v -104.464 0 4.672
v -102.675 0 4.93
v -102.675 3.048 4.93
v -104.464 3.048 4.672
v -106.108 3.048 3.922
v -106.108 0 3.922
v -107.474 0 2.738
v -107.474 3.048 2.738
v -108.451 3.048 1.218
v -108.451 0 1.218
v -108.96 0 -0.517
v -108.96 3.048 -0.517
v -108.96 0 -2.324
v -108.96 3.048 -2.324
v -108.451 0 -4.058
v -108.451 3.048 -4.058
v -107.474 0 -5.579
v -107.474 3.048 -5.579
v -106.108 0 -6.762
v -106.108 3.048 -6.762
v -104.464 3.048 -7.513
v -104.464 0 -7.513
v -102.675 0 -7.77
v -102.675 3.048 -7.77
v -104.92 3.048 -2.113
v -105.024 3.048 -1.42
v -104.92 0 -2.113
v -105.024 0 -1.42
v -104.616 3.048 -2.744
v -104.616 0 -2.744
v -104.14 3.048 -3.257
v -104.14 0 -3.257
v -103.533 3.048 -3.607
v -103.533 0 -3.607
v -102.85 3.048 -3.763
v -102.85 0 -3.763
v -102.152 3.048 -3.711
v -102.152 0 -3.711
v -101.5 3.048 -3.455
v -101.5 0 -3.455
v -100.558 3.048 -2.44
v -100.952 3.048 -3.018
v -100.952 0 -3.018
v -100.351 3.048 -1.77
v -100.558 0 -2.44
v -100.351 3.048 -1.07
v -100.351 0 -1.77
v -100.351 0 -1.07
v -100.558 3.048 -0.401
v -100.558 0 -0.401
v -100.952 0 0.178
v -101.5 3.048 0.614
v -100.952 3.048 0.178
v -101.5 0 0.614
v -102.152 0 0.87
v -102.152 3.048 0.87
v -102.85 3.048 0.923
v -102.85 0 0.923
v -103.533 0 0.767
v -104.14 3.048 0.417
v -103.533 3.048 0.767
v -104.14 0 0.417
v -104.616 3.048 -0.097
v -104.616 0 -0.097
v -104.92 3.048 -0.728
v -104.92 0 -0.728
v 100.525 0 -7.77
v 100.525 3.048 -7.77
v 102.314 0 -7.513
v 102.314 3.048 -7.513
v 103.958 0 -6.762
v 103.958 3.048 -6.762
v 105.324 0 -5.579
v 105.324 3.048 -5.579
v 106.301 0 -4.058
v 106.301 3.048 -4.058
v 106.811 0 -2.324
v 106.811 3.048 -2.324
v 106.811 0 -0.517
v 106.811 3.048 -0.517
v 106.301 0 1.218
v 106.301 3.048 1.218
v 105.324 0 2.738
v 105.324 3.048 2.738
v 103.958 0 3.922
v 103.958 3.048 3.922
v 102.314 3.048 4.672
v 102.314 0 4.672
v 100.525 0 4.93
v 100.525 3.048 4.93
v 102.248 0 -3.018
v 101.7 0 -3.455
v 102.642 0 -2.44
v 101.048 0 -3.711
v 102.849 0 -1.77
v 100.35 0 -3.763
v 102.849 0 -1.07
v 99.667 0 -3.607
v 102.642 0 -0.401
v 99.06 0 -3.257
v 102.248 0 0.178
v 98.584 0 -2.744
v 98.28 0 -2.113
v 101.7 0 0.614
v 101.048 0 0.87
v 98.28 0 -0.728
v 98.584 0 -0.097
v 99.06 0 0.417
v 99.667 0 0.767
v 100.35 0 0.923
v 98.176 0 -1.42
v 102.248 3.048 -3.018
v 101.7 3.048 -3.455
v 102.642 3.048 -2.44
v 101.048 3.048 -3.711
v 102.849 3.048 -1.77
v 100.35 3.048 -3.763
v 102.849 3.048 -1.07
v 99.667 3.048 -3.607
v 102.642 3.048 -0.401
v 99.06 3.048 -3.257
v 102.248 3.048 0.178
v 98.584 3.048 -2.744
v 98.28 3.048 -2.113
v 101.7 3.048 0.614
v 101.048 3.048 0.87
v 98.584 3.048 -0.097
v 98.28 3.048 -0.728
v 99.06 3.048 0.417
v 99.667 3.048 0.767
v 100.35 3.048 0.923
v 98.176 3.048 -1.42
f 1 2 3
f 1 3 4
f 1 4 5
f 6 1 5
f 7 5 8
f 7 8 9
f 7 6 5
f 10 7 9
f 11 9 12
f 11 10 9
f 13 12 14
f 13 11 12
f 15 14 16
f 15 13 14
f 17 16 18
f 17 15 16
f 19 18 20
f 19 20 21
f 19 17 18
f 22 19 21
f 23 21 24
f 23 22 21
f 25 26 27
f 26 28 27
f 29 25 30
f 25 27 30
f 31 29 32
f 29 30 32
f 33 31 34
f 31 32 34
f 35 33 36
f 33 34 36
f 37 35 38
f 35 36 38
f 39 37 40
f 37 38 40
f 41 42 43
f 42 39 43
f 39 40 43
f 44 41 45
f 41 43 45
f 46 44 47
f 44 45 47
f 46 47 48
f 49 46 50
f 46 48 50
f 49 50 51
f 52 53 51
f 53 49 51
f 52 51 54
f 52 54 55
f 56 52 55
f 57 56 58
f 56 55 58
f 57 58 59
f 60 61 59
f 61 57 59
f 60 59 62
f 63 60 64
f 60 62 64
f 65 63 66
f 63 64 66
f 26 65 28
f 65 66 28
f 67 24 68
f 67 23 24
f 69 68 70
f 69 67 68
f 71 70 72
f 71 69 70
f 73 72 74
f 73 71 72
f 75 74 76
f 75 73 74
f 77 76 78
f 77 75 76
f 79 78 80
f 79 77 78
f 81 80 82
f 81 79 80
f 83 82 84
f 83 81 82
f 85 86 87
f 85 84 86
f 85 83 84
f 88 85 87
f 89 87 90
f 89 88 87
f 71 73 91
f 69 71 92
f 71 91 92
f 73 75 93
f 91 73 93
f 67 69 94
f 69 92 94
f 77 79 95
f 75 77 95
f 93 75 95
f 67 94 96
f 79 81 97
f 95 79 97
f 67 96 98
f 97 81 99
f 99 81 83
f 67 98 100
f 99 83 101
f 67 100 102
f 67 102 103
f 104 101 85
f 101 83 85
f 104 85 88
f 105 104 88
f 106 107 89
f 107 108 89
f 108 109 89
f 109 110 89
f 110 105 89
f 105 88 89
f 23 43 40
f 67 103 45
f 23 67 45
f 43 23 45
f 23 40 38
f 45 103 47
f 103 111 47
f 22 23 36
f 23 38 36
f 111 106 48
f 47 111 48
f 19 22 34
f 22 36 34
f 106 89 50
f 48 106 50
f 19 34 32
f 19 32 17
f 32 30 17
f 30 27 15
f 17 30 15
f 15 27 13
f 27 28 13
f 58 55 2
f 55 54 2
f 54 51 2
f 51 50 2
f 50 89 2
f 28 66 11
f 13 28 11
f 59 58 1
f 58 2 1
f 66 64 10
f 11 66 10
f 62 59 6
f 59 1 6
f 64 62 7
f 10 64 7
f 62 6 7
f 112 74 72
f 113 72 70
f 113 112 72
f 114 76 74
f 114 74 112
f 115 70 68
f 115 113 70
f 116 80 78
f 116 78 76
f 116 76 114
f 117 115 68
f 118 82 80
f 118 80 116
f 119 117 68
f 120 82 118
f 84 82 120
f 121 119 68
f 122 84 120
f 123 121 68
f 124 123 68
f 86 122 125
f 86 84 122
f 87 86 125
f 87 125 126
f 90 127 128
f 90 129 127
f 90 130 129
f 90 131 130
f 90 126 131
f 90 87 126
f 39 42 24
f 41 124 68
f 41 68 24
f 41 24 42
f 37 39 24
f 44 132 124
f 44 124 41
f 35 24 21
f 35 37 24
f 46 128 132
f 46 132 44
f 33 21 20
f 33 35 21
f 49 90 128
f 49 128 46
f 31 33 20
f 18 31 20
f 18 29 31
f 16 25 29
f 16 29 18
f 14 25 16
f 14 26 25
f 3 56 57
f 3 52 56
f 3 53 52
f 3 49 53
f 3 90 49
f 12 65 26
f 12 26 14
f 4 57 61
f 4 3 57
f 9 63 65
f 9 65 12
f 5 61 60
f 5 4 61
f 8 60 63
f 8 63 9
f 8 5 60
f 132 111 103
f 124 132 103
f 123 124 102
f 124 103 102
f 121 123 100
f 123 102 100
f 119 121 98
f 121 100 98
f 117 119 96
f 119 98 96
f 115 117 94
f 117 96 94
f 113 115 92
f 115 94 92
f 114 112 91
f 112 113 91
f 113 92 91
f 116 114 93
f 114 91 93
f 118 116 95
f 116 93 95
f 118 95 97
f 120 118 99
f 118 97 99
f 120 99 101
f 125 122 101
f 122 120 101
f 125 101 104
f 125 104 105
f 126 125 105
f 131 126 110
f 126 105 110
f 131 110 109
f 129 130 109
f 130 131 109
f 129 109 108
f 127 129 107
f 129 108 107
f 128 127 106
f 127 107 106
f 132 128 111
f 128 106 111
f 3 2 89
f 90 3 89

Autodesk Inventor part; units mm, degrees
ref_plane "YZ Plane" through (0, 0, 0) normal (1, 0, 0) x (0, 1, 0)
ref_plane "XZ Plane" through (0, 0, 0) normal (0, 1, 0) x (-1, 0, 0)
ref_plane "XY Plane" through (0, 0, 0) normal (0, 0, 1) x (1, 0, 0)
sketch "Sketch1" plane through (0, 0, 0) normal (0, 1, 0) x (-1, 0, 0)
  circle A0 centre (102.6747, -1.4203) radius 2.1844 construction
  circle A1 centre (-100.5253, -1.4203) radius 2.1844 construction
  circle A2 centre (102.6747, -1.4203) radius 2.3495
  circle A3 centre (-100.5253, -1.4203) radius 2.3495
  circle A4 centre (102.6747, -1.4203) radius 6.35
  circle A5 centre (-100.5253, -1.4203) radius 6.35
  line L0 (102.6747, -7.7703) -> (-100.5253, -7.7703)
  line L1 (102.6747, 4.9297) -> (-100.5253, 4.9297)
  point P0 (0, 0)
  dimension "d0" = 4.699
  dimension "d1" = 4.699
  dimension "d2" = 12.7
  dimension "d3" = 12.7
extrude "Plate1" add sketch "Sketch1" along normal blind 3.048
equation "\"d4\" = Thickness"
equation "\"BendRadius\" = Thickness"
equation "\"BendReliefWidth\" = Thickness"
equation "\"BendReliefDepth\" = 0.5 * Thickness"
equation "\"CornerReliefSize\" = 4 * Thickness"
equation "\"MinimumRemnant\" = 2 * Thickness"
equation "\"TransitionRadius\" = BendRadius"
equation "\"JacobiRadiusSize\" = BendRadius"
equation "\"GapSize\" = Thickness"
equation "\"Thickness\" = 3.048"
properties part number "undersideStrip"
